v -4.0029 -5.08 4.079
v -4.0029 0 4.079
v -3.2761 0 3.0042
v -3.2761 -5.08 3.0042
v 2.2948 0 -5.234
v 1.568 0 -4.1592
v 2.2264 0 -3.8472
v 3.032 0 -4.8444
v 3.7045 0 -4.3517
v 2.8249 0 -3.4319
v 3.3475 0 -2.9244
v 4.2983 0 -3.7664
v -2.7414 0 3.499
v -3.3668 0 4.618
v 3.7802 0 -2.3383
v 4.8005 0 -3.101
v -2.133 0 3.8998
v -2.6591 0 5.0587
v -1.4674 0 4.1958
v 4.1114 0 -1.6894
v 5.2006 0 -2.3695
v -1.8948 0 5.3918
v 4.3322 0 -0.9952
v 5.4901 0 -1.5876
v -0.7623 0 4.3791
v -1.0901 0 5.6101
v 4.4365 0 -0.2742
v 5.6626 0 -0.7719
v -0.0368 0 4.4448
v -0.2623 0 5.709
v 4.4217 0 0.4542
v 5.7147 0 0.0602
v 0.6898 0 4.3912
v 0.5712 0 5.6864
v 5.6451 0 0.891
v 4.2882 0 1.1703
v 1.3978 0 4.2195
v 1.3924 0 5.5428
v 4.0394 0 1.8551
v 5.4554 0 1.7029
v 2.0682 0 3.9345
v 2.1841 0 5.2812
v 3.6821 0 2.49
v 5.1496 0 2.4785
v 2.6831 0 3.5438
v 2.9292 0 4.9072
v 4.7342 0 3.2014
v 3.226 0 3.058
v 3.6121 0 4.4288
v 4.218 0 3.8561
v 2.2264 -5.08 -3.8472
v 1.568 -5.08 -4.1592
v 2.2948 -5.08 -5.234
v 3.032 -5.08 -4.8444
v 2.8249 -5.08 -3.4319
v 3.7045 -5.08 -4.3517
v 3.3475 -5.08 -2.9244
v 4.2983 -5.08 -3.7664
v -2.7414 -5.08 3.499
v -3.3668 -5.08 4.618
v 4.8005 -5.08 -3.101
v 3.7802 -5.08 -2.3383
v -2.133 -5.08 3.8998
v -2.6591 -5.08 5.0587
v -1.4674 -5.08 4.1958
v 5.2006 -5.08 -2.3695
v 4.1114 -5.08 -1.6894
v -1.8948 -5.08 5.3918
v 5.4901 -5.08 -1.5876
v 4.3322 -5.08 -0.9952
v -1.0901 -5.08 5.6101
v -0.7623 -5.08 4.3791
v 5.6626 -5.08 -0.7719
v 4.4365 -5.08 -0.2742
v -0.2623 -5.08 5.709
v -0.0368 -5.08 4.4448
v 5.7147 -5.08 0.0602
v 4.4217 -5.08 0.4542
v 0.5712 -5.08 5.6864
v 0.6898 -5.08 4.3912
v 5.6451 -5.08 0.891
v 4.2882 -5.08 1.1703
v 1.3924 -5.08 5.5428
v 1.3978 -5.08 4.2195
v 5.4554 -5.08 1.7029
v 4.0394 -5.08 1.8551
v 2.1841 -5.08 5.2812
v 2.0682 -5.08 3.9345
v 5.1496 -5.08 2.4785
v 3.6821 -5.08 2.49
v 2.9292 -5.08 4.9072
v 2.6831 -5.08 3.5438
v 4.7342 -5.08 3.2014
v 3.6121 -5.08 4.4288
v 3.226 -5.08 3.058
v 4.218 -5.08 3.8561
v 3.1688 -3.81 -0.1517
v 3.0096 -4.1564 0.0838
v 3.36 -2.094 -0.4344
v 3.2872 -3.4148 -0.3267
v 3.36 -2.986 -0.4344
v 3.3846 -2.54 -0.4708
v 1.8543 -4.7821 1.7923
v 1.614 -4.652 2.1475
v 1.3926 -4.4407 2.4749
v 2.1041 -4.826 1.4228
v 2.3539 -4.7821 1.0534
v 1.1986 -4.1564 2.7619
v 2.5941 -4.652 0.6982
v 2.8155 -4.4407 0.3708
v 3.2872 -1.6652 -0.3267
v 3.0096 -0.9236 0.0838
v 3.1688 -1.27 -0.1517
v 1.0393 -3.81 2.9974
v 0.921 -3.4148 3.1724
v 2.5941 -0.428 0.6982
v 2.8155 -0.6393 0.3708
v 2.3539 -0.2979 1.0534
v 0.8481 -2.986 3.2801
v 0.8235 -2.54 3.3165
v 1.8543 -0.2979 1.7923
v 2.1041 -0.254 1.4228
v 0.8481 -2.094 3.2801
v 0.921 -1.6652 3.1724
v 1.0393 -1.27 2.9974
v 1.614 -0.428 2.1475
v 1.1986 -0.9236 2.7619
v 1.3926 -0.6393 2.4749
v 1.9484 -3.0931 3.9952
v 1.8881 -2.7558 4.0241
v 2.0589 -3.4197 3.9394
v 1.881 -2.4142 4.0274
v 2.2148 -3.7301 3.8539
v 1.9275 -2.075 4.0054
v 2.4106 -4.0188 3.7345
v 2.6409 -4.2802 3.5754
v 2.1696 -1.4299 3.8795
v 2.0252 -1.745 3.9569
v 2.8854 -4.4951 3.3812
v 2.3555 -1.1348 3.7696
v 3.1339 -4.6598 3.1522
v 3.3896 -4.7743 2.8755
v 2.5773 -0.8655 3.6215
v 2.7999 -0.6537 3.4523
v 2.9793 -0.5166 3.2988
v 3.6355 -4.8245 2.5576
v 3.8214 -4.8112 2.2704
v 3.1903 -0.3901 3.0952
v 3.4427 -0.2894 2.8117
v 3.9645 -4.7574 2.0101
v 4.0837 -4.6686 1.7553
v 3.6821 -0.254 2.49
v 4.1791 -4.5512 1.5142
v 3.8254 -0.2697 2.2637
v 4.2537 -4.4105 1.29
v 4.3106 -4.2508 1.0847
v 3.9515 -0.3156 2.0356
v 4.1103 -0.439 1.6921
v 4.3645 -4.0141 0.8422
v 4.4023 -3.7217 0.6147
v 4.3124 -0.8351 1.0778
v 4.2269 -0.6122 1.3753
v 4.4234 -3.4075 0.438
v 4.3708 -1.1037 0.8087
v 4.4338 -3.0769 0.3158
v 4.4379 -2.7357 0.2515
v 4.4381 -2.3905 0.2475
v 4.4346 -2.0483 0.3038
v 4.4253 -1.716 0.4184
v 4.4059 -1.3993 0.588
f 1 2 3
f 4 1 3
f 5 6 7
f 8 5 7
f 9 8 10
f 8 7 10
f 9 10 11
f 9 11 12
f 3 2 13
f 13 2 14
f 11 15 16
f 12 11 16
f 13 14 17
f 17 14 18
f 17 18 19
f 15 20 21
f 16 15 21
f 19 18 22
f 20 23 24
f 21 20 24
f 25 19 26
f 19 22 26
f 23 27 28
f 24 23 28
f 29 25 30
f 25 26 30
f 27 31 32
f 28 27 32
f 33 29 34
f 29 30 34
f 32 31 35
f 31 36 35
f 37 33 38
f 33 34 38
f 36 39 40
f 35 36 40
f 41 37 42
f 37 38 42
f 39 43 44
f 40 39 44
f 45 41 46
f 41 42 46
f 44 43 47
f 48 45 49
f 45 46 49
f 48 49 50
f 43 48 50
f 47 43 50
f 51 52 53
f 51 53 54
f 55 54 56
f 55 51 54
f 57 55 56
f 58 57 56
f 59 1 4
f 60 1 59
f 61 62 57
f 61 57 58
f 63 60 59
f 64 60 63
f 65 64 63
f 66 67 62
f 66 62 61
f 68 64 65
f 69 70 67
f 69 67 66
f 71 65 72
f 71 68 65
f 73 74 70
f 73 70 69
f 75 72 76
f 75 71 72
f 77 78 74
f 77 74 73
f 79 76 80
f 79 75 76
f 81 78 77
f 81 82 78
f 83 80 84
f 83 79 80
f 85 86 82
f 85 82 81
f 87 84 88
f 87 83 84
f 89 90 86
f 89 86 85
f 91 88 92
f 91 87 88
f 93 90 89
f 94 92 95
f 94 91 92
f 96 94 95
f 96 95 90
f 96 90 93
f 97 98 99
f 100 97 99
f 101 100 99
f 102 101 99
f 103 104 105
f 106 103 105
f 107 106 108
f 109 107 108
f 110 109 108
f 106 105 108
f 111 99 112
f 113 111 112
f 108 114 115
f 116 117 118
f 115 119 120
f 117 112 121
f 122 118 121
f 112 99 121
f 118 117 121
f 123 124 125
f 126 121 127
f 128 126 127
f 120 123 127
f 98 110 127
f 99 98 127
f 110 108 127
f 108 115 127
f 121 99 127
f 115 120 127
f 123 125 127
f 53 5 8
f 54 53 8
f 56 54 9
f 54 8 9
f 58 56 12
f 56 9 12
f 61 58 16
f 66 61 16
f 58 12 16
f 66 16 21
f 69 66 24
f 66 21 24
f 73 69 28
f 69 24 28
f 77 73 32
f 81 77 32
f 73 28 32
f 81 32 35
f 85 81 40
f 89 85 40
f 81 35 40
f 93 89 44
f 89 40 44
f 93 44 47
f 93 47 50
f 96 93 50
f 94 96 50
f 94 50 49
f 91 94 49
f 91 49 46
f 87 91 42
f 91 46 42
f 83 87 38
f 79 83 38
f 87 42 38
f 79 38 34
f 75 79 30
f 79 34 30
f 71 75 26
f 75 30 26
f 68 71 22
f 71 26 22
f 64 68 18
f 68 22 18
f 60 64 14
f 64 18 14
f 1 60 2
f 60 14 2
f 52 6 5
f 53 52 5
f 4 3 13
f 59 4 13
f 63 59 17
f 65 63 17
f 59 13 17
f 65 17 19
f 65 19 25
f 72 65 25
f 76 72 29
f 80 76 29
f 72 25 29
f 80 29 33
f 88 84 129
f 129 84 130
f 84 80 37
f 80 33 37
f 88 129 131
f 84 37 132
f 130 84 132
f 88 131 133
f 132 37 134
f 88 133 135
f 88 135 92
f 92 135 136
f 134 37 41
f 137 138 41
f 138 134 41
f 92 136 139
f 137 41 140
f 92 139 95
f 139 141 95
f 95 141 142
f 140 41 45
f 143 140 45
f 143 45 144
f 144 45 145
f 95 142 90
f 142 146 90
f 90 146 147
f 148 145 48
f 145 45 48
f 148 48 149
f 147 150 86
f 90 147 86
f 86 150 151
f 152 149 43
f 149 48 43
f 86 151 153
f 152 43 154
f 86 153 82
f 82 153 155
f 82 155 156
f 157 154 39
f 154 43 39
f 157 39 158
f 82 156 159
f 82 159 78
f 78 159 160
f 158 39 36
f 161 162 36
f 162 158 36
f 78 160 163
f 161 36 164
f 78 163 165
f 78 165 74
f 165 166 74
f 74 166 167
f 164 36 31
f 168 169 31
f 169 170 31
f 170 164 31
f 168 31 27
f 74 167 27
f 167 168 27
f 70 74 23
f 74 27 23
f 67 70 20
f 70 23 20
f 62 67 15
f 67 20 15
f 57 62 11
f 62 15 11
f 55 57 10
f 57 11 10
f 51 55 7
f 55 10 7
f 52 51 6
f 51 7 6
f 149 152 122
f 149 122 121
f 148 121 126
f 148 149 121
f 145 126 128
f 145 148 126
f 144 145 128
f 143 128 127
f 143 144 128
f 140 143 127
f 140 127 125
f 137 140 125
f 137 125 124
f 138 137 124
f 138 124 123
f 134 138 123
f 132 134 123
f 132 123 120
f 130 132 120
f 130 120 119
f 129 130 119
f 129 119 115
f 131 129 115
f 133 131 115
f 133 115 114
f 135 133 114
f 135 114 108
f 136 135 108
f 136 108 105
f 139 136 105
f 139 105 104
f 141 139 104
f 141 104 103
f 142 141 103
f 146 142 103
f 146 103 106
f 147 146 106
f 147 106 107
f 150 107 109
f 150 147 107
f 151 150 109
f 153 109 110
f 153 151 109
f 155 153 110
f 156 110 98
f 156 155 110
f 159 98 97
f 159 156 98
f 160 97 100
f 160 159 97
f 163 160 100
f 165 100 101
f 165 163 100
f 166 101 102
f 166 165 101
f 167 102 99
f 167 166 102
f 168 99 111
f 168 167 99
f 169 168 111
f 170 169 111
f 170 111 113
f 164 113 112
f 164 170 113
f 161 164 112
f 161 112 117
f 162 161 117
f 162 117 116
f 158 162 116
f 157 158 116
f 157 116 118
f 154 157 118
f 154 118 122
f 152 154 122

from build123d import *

# Parameters (mm, degrees)
F1_DEPTH = 5.08
F5_R     = 2.286
F6_DEPTH = 2.54


with BuildPart() as f1:
    # F0 (on Front) → F1 (new body)
    with BuildSketch(Plane.XZ):
        with BuildLine():
            ThreePointArc((-3.2760911955, 3.0042056319), (3.6821316631, 2.4899661475), (1.5680416715, -4.1592391512))
            Line((1.5680416715, -4.1592391512), (2.2948386219, -5.2340176442))
            ThreePointArc((2.2948386219, -5.2340176442), (4.7341692811, 3.2013850468), (-4.0028881459, 4.0789841249))
            Line((-4.0028881459, 4.0789841249), (-3.2760911955, 3.0042056319))
        make_face()
    extrude(amount=F1_DEPTH)

    # F5 (on mid) → F6 (join)
    with BuildSketch(Plane(origin=(4.2081504721, 0, 2.8456755972), x_dir=(0, 1, 0), z_dir=(0.8283760772, 0, 0.5601723617))):
        with Locations((-2.54, 0)):
            Circle(F5_R)
    extrude(amount=-F6_DEPTH)


solid = f1.part
